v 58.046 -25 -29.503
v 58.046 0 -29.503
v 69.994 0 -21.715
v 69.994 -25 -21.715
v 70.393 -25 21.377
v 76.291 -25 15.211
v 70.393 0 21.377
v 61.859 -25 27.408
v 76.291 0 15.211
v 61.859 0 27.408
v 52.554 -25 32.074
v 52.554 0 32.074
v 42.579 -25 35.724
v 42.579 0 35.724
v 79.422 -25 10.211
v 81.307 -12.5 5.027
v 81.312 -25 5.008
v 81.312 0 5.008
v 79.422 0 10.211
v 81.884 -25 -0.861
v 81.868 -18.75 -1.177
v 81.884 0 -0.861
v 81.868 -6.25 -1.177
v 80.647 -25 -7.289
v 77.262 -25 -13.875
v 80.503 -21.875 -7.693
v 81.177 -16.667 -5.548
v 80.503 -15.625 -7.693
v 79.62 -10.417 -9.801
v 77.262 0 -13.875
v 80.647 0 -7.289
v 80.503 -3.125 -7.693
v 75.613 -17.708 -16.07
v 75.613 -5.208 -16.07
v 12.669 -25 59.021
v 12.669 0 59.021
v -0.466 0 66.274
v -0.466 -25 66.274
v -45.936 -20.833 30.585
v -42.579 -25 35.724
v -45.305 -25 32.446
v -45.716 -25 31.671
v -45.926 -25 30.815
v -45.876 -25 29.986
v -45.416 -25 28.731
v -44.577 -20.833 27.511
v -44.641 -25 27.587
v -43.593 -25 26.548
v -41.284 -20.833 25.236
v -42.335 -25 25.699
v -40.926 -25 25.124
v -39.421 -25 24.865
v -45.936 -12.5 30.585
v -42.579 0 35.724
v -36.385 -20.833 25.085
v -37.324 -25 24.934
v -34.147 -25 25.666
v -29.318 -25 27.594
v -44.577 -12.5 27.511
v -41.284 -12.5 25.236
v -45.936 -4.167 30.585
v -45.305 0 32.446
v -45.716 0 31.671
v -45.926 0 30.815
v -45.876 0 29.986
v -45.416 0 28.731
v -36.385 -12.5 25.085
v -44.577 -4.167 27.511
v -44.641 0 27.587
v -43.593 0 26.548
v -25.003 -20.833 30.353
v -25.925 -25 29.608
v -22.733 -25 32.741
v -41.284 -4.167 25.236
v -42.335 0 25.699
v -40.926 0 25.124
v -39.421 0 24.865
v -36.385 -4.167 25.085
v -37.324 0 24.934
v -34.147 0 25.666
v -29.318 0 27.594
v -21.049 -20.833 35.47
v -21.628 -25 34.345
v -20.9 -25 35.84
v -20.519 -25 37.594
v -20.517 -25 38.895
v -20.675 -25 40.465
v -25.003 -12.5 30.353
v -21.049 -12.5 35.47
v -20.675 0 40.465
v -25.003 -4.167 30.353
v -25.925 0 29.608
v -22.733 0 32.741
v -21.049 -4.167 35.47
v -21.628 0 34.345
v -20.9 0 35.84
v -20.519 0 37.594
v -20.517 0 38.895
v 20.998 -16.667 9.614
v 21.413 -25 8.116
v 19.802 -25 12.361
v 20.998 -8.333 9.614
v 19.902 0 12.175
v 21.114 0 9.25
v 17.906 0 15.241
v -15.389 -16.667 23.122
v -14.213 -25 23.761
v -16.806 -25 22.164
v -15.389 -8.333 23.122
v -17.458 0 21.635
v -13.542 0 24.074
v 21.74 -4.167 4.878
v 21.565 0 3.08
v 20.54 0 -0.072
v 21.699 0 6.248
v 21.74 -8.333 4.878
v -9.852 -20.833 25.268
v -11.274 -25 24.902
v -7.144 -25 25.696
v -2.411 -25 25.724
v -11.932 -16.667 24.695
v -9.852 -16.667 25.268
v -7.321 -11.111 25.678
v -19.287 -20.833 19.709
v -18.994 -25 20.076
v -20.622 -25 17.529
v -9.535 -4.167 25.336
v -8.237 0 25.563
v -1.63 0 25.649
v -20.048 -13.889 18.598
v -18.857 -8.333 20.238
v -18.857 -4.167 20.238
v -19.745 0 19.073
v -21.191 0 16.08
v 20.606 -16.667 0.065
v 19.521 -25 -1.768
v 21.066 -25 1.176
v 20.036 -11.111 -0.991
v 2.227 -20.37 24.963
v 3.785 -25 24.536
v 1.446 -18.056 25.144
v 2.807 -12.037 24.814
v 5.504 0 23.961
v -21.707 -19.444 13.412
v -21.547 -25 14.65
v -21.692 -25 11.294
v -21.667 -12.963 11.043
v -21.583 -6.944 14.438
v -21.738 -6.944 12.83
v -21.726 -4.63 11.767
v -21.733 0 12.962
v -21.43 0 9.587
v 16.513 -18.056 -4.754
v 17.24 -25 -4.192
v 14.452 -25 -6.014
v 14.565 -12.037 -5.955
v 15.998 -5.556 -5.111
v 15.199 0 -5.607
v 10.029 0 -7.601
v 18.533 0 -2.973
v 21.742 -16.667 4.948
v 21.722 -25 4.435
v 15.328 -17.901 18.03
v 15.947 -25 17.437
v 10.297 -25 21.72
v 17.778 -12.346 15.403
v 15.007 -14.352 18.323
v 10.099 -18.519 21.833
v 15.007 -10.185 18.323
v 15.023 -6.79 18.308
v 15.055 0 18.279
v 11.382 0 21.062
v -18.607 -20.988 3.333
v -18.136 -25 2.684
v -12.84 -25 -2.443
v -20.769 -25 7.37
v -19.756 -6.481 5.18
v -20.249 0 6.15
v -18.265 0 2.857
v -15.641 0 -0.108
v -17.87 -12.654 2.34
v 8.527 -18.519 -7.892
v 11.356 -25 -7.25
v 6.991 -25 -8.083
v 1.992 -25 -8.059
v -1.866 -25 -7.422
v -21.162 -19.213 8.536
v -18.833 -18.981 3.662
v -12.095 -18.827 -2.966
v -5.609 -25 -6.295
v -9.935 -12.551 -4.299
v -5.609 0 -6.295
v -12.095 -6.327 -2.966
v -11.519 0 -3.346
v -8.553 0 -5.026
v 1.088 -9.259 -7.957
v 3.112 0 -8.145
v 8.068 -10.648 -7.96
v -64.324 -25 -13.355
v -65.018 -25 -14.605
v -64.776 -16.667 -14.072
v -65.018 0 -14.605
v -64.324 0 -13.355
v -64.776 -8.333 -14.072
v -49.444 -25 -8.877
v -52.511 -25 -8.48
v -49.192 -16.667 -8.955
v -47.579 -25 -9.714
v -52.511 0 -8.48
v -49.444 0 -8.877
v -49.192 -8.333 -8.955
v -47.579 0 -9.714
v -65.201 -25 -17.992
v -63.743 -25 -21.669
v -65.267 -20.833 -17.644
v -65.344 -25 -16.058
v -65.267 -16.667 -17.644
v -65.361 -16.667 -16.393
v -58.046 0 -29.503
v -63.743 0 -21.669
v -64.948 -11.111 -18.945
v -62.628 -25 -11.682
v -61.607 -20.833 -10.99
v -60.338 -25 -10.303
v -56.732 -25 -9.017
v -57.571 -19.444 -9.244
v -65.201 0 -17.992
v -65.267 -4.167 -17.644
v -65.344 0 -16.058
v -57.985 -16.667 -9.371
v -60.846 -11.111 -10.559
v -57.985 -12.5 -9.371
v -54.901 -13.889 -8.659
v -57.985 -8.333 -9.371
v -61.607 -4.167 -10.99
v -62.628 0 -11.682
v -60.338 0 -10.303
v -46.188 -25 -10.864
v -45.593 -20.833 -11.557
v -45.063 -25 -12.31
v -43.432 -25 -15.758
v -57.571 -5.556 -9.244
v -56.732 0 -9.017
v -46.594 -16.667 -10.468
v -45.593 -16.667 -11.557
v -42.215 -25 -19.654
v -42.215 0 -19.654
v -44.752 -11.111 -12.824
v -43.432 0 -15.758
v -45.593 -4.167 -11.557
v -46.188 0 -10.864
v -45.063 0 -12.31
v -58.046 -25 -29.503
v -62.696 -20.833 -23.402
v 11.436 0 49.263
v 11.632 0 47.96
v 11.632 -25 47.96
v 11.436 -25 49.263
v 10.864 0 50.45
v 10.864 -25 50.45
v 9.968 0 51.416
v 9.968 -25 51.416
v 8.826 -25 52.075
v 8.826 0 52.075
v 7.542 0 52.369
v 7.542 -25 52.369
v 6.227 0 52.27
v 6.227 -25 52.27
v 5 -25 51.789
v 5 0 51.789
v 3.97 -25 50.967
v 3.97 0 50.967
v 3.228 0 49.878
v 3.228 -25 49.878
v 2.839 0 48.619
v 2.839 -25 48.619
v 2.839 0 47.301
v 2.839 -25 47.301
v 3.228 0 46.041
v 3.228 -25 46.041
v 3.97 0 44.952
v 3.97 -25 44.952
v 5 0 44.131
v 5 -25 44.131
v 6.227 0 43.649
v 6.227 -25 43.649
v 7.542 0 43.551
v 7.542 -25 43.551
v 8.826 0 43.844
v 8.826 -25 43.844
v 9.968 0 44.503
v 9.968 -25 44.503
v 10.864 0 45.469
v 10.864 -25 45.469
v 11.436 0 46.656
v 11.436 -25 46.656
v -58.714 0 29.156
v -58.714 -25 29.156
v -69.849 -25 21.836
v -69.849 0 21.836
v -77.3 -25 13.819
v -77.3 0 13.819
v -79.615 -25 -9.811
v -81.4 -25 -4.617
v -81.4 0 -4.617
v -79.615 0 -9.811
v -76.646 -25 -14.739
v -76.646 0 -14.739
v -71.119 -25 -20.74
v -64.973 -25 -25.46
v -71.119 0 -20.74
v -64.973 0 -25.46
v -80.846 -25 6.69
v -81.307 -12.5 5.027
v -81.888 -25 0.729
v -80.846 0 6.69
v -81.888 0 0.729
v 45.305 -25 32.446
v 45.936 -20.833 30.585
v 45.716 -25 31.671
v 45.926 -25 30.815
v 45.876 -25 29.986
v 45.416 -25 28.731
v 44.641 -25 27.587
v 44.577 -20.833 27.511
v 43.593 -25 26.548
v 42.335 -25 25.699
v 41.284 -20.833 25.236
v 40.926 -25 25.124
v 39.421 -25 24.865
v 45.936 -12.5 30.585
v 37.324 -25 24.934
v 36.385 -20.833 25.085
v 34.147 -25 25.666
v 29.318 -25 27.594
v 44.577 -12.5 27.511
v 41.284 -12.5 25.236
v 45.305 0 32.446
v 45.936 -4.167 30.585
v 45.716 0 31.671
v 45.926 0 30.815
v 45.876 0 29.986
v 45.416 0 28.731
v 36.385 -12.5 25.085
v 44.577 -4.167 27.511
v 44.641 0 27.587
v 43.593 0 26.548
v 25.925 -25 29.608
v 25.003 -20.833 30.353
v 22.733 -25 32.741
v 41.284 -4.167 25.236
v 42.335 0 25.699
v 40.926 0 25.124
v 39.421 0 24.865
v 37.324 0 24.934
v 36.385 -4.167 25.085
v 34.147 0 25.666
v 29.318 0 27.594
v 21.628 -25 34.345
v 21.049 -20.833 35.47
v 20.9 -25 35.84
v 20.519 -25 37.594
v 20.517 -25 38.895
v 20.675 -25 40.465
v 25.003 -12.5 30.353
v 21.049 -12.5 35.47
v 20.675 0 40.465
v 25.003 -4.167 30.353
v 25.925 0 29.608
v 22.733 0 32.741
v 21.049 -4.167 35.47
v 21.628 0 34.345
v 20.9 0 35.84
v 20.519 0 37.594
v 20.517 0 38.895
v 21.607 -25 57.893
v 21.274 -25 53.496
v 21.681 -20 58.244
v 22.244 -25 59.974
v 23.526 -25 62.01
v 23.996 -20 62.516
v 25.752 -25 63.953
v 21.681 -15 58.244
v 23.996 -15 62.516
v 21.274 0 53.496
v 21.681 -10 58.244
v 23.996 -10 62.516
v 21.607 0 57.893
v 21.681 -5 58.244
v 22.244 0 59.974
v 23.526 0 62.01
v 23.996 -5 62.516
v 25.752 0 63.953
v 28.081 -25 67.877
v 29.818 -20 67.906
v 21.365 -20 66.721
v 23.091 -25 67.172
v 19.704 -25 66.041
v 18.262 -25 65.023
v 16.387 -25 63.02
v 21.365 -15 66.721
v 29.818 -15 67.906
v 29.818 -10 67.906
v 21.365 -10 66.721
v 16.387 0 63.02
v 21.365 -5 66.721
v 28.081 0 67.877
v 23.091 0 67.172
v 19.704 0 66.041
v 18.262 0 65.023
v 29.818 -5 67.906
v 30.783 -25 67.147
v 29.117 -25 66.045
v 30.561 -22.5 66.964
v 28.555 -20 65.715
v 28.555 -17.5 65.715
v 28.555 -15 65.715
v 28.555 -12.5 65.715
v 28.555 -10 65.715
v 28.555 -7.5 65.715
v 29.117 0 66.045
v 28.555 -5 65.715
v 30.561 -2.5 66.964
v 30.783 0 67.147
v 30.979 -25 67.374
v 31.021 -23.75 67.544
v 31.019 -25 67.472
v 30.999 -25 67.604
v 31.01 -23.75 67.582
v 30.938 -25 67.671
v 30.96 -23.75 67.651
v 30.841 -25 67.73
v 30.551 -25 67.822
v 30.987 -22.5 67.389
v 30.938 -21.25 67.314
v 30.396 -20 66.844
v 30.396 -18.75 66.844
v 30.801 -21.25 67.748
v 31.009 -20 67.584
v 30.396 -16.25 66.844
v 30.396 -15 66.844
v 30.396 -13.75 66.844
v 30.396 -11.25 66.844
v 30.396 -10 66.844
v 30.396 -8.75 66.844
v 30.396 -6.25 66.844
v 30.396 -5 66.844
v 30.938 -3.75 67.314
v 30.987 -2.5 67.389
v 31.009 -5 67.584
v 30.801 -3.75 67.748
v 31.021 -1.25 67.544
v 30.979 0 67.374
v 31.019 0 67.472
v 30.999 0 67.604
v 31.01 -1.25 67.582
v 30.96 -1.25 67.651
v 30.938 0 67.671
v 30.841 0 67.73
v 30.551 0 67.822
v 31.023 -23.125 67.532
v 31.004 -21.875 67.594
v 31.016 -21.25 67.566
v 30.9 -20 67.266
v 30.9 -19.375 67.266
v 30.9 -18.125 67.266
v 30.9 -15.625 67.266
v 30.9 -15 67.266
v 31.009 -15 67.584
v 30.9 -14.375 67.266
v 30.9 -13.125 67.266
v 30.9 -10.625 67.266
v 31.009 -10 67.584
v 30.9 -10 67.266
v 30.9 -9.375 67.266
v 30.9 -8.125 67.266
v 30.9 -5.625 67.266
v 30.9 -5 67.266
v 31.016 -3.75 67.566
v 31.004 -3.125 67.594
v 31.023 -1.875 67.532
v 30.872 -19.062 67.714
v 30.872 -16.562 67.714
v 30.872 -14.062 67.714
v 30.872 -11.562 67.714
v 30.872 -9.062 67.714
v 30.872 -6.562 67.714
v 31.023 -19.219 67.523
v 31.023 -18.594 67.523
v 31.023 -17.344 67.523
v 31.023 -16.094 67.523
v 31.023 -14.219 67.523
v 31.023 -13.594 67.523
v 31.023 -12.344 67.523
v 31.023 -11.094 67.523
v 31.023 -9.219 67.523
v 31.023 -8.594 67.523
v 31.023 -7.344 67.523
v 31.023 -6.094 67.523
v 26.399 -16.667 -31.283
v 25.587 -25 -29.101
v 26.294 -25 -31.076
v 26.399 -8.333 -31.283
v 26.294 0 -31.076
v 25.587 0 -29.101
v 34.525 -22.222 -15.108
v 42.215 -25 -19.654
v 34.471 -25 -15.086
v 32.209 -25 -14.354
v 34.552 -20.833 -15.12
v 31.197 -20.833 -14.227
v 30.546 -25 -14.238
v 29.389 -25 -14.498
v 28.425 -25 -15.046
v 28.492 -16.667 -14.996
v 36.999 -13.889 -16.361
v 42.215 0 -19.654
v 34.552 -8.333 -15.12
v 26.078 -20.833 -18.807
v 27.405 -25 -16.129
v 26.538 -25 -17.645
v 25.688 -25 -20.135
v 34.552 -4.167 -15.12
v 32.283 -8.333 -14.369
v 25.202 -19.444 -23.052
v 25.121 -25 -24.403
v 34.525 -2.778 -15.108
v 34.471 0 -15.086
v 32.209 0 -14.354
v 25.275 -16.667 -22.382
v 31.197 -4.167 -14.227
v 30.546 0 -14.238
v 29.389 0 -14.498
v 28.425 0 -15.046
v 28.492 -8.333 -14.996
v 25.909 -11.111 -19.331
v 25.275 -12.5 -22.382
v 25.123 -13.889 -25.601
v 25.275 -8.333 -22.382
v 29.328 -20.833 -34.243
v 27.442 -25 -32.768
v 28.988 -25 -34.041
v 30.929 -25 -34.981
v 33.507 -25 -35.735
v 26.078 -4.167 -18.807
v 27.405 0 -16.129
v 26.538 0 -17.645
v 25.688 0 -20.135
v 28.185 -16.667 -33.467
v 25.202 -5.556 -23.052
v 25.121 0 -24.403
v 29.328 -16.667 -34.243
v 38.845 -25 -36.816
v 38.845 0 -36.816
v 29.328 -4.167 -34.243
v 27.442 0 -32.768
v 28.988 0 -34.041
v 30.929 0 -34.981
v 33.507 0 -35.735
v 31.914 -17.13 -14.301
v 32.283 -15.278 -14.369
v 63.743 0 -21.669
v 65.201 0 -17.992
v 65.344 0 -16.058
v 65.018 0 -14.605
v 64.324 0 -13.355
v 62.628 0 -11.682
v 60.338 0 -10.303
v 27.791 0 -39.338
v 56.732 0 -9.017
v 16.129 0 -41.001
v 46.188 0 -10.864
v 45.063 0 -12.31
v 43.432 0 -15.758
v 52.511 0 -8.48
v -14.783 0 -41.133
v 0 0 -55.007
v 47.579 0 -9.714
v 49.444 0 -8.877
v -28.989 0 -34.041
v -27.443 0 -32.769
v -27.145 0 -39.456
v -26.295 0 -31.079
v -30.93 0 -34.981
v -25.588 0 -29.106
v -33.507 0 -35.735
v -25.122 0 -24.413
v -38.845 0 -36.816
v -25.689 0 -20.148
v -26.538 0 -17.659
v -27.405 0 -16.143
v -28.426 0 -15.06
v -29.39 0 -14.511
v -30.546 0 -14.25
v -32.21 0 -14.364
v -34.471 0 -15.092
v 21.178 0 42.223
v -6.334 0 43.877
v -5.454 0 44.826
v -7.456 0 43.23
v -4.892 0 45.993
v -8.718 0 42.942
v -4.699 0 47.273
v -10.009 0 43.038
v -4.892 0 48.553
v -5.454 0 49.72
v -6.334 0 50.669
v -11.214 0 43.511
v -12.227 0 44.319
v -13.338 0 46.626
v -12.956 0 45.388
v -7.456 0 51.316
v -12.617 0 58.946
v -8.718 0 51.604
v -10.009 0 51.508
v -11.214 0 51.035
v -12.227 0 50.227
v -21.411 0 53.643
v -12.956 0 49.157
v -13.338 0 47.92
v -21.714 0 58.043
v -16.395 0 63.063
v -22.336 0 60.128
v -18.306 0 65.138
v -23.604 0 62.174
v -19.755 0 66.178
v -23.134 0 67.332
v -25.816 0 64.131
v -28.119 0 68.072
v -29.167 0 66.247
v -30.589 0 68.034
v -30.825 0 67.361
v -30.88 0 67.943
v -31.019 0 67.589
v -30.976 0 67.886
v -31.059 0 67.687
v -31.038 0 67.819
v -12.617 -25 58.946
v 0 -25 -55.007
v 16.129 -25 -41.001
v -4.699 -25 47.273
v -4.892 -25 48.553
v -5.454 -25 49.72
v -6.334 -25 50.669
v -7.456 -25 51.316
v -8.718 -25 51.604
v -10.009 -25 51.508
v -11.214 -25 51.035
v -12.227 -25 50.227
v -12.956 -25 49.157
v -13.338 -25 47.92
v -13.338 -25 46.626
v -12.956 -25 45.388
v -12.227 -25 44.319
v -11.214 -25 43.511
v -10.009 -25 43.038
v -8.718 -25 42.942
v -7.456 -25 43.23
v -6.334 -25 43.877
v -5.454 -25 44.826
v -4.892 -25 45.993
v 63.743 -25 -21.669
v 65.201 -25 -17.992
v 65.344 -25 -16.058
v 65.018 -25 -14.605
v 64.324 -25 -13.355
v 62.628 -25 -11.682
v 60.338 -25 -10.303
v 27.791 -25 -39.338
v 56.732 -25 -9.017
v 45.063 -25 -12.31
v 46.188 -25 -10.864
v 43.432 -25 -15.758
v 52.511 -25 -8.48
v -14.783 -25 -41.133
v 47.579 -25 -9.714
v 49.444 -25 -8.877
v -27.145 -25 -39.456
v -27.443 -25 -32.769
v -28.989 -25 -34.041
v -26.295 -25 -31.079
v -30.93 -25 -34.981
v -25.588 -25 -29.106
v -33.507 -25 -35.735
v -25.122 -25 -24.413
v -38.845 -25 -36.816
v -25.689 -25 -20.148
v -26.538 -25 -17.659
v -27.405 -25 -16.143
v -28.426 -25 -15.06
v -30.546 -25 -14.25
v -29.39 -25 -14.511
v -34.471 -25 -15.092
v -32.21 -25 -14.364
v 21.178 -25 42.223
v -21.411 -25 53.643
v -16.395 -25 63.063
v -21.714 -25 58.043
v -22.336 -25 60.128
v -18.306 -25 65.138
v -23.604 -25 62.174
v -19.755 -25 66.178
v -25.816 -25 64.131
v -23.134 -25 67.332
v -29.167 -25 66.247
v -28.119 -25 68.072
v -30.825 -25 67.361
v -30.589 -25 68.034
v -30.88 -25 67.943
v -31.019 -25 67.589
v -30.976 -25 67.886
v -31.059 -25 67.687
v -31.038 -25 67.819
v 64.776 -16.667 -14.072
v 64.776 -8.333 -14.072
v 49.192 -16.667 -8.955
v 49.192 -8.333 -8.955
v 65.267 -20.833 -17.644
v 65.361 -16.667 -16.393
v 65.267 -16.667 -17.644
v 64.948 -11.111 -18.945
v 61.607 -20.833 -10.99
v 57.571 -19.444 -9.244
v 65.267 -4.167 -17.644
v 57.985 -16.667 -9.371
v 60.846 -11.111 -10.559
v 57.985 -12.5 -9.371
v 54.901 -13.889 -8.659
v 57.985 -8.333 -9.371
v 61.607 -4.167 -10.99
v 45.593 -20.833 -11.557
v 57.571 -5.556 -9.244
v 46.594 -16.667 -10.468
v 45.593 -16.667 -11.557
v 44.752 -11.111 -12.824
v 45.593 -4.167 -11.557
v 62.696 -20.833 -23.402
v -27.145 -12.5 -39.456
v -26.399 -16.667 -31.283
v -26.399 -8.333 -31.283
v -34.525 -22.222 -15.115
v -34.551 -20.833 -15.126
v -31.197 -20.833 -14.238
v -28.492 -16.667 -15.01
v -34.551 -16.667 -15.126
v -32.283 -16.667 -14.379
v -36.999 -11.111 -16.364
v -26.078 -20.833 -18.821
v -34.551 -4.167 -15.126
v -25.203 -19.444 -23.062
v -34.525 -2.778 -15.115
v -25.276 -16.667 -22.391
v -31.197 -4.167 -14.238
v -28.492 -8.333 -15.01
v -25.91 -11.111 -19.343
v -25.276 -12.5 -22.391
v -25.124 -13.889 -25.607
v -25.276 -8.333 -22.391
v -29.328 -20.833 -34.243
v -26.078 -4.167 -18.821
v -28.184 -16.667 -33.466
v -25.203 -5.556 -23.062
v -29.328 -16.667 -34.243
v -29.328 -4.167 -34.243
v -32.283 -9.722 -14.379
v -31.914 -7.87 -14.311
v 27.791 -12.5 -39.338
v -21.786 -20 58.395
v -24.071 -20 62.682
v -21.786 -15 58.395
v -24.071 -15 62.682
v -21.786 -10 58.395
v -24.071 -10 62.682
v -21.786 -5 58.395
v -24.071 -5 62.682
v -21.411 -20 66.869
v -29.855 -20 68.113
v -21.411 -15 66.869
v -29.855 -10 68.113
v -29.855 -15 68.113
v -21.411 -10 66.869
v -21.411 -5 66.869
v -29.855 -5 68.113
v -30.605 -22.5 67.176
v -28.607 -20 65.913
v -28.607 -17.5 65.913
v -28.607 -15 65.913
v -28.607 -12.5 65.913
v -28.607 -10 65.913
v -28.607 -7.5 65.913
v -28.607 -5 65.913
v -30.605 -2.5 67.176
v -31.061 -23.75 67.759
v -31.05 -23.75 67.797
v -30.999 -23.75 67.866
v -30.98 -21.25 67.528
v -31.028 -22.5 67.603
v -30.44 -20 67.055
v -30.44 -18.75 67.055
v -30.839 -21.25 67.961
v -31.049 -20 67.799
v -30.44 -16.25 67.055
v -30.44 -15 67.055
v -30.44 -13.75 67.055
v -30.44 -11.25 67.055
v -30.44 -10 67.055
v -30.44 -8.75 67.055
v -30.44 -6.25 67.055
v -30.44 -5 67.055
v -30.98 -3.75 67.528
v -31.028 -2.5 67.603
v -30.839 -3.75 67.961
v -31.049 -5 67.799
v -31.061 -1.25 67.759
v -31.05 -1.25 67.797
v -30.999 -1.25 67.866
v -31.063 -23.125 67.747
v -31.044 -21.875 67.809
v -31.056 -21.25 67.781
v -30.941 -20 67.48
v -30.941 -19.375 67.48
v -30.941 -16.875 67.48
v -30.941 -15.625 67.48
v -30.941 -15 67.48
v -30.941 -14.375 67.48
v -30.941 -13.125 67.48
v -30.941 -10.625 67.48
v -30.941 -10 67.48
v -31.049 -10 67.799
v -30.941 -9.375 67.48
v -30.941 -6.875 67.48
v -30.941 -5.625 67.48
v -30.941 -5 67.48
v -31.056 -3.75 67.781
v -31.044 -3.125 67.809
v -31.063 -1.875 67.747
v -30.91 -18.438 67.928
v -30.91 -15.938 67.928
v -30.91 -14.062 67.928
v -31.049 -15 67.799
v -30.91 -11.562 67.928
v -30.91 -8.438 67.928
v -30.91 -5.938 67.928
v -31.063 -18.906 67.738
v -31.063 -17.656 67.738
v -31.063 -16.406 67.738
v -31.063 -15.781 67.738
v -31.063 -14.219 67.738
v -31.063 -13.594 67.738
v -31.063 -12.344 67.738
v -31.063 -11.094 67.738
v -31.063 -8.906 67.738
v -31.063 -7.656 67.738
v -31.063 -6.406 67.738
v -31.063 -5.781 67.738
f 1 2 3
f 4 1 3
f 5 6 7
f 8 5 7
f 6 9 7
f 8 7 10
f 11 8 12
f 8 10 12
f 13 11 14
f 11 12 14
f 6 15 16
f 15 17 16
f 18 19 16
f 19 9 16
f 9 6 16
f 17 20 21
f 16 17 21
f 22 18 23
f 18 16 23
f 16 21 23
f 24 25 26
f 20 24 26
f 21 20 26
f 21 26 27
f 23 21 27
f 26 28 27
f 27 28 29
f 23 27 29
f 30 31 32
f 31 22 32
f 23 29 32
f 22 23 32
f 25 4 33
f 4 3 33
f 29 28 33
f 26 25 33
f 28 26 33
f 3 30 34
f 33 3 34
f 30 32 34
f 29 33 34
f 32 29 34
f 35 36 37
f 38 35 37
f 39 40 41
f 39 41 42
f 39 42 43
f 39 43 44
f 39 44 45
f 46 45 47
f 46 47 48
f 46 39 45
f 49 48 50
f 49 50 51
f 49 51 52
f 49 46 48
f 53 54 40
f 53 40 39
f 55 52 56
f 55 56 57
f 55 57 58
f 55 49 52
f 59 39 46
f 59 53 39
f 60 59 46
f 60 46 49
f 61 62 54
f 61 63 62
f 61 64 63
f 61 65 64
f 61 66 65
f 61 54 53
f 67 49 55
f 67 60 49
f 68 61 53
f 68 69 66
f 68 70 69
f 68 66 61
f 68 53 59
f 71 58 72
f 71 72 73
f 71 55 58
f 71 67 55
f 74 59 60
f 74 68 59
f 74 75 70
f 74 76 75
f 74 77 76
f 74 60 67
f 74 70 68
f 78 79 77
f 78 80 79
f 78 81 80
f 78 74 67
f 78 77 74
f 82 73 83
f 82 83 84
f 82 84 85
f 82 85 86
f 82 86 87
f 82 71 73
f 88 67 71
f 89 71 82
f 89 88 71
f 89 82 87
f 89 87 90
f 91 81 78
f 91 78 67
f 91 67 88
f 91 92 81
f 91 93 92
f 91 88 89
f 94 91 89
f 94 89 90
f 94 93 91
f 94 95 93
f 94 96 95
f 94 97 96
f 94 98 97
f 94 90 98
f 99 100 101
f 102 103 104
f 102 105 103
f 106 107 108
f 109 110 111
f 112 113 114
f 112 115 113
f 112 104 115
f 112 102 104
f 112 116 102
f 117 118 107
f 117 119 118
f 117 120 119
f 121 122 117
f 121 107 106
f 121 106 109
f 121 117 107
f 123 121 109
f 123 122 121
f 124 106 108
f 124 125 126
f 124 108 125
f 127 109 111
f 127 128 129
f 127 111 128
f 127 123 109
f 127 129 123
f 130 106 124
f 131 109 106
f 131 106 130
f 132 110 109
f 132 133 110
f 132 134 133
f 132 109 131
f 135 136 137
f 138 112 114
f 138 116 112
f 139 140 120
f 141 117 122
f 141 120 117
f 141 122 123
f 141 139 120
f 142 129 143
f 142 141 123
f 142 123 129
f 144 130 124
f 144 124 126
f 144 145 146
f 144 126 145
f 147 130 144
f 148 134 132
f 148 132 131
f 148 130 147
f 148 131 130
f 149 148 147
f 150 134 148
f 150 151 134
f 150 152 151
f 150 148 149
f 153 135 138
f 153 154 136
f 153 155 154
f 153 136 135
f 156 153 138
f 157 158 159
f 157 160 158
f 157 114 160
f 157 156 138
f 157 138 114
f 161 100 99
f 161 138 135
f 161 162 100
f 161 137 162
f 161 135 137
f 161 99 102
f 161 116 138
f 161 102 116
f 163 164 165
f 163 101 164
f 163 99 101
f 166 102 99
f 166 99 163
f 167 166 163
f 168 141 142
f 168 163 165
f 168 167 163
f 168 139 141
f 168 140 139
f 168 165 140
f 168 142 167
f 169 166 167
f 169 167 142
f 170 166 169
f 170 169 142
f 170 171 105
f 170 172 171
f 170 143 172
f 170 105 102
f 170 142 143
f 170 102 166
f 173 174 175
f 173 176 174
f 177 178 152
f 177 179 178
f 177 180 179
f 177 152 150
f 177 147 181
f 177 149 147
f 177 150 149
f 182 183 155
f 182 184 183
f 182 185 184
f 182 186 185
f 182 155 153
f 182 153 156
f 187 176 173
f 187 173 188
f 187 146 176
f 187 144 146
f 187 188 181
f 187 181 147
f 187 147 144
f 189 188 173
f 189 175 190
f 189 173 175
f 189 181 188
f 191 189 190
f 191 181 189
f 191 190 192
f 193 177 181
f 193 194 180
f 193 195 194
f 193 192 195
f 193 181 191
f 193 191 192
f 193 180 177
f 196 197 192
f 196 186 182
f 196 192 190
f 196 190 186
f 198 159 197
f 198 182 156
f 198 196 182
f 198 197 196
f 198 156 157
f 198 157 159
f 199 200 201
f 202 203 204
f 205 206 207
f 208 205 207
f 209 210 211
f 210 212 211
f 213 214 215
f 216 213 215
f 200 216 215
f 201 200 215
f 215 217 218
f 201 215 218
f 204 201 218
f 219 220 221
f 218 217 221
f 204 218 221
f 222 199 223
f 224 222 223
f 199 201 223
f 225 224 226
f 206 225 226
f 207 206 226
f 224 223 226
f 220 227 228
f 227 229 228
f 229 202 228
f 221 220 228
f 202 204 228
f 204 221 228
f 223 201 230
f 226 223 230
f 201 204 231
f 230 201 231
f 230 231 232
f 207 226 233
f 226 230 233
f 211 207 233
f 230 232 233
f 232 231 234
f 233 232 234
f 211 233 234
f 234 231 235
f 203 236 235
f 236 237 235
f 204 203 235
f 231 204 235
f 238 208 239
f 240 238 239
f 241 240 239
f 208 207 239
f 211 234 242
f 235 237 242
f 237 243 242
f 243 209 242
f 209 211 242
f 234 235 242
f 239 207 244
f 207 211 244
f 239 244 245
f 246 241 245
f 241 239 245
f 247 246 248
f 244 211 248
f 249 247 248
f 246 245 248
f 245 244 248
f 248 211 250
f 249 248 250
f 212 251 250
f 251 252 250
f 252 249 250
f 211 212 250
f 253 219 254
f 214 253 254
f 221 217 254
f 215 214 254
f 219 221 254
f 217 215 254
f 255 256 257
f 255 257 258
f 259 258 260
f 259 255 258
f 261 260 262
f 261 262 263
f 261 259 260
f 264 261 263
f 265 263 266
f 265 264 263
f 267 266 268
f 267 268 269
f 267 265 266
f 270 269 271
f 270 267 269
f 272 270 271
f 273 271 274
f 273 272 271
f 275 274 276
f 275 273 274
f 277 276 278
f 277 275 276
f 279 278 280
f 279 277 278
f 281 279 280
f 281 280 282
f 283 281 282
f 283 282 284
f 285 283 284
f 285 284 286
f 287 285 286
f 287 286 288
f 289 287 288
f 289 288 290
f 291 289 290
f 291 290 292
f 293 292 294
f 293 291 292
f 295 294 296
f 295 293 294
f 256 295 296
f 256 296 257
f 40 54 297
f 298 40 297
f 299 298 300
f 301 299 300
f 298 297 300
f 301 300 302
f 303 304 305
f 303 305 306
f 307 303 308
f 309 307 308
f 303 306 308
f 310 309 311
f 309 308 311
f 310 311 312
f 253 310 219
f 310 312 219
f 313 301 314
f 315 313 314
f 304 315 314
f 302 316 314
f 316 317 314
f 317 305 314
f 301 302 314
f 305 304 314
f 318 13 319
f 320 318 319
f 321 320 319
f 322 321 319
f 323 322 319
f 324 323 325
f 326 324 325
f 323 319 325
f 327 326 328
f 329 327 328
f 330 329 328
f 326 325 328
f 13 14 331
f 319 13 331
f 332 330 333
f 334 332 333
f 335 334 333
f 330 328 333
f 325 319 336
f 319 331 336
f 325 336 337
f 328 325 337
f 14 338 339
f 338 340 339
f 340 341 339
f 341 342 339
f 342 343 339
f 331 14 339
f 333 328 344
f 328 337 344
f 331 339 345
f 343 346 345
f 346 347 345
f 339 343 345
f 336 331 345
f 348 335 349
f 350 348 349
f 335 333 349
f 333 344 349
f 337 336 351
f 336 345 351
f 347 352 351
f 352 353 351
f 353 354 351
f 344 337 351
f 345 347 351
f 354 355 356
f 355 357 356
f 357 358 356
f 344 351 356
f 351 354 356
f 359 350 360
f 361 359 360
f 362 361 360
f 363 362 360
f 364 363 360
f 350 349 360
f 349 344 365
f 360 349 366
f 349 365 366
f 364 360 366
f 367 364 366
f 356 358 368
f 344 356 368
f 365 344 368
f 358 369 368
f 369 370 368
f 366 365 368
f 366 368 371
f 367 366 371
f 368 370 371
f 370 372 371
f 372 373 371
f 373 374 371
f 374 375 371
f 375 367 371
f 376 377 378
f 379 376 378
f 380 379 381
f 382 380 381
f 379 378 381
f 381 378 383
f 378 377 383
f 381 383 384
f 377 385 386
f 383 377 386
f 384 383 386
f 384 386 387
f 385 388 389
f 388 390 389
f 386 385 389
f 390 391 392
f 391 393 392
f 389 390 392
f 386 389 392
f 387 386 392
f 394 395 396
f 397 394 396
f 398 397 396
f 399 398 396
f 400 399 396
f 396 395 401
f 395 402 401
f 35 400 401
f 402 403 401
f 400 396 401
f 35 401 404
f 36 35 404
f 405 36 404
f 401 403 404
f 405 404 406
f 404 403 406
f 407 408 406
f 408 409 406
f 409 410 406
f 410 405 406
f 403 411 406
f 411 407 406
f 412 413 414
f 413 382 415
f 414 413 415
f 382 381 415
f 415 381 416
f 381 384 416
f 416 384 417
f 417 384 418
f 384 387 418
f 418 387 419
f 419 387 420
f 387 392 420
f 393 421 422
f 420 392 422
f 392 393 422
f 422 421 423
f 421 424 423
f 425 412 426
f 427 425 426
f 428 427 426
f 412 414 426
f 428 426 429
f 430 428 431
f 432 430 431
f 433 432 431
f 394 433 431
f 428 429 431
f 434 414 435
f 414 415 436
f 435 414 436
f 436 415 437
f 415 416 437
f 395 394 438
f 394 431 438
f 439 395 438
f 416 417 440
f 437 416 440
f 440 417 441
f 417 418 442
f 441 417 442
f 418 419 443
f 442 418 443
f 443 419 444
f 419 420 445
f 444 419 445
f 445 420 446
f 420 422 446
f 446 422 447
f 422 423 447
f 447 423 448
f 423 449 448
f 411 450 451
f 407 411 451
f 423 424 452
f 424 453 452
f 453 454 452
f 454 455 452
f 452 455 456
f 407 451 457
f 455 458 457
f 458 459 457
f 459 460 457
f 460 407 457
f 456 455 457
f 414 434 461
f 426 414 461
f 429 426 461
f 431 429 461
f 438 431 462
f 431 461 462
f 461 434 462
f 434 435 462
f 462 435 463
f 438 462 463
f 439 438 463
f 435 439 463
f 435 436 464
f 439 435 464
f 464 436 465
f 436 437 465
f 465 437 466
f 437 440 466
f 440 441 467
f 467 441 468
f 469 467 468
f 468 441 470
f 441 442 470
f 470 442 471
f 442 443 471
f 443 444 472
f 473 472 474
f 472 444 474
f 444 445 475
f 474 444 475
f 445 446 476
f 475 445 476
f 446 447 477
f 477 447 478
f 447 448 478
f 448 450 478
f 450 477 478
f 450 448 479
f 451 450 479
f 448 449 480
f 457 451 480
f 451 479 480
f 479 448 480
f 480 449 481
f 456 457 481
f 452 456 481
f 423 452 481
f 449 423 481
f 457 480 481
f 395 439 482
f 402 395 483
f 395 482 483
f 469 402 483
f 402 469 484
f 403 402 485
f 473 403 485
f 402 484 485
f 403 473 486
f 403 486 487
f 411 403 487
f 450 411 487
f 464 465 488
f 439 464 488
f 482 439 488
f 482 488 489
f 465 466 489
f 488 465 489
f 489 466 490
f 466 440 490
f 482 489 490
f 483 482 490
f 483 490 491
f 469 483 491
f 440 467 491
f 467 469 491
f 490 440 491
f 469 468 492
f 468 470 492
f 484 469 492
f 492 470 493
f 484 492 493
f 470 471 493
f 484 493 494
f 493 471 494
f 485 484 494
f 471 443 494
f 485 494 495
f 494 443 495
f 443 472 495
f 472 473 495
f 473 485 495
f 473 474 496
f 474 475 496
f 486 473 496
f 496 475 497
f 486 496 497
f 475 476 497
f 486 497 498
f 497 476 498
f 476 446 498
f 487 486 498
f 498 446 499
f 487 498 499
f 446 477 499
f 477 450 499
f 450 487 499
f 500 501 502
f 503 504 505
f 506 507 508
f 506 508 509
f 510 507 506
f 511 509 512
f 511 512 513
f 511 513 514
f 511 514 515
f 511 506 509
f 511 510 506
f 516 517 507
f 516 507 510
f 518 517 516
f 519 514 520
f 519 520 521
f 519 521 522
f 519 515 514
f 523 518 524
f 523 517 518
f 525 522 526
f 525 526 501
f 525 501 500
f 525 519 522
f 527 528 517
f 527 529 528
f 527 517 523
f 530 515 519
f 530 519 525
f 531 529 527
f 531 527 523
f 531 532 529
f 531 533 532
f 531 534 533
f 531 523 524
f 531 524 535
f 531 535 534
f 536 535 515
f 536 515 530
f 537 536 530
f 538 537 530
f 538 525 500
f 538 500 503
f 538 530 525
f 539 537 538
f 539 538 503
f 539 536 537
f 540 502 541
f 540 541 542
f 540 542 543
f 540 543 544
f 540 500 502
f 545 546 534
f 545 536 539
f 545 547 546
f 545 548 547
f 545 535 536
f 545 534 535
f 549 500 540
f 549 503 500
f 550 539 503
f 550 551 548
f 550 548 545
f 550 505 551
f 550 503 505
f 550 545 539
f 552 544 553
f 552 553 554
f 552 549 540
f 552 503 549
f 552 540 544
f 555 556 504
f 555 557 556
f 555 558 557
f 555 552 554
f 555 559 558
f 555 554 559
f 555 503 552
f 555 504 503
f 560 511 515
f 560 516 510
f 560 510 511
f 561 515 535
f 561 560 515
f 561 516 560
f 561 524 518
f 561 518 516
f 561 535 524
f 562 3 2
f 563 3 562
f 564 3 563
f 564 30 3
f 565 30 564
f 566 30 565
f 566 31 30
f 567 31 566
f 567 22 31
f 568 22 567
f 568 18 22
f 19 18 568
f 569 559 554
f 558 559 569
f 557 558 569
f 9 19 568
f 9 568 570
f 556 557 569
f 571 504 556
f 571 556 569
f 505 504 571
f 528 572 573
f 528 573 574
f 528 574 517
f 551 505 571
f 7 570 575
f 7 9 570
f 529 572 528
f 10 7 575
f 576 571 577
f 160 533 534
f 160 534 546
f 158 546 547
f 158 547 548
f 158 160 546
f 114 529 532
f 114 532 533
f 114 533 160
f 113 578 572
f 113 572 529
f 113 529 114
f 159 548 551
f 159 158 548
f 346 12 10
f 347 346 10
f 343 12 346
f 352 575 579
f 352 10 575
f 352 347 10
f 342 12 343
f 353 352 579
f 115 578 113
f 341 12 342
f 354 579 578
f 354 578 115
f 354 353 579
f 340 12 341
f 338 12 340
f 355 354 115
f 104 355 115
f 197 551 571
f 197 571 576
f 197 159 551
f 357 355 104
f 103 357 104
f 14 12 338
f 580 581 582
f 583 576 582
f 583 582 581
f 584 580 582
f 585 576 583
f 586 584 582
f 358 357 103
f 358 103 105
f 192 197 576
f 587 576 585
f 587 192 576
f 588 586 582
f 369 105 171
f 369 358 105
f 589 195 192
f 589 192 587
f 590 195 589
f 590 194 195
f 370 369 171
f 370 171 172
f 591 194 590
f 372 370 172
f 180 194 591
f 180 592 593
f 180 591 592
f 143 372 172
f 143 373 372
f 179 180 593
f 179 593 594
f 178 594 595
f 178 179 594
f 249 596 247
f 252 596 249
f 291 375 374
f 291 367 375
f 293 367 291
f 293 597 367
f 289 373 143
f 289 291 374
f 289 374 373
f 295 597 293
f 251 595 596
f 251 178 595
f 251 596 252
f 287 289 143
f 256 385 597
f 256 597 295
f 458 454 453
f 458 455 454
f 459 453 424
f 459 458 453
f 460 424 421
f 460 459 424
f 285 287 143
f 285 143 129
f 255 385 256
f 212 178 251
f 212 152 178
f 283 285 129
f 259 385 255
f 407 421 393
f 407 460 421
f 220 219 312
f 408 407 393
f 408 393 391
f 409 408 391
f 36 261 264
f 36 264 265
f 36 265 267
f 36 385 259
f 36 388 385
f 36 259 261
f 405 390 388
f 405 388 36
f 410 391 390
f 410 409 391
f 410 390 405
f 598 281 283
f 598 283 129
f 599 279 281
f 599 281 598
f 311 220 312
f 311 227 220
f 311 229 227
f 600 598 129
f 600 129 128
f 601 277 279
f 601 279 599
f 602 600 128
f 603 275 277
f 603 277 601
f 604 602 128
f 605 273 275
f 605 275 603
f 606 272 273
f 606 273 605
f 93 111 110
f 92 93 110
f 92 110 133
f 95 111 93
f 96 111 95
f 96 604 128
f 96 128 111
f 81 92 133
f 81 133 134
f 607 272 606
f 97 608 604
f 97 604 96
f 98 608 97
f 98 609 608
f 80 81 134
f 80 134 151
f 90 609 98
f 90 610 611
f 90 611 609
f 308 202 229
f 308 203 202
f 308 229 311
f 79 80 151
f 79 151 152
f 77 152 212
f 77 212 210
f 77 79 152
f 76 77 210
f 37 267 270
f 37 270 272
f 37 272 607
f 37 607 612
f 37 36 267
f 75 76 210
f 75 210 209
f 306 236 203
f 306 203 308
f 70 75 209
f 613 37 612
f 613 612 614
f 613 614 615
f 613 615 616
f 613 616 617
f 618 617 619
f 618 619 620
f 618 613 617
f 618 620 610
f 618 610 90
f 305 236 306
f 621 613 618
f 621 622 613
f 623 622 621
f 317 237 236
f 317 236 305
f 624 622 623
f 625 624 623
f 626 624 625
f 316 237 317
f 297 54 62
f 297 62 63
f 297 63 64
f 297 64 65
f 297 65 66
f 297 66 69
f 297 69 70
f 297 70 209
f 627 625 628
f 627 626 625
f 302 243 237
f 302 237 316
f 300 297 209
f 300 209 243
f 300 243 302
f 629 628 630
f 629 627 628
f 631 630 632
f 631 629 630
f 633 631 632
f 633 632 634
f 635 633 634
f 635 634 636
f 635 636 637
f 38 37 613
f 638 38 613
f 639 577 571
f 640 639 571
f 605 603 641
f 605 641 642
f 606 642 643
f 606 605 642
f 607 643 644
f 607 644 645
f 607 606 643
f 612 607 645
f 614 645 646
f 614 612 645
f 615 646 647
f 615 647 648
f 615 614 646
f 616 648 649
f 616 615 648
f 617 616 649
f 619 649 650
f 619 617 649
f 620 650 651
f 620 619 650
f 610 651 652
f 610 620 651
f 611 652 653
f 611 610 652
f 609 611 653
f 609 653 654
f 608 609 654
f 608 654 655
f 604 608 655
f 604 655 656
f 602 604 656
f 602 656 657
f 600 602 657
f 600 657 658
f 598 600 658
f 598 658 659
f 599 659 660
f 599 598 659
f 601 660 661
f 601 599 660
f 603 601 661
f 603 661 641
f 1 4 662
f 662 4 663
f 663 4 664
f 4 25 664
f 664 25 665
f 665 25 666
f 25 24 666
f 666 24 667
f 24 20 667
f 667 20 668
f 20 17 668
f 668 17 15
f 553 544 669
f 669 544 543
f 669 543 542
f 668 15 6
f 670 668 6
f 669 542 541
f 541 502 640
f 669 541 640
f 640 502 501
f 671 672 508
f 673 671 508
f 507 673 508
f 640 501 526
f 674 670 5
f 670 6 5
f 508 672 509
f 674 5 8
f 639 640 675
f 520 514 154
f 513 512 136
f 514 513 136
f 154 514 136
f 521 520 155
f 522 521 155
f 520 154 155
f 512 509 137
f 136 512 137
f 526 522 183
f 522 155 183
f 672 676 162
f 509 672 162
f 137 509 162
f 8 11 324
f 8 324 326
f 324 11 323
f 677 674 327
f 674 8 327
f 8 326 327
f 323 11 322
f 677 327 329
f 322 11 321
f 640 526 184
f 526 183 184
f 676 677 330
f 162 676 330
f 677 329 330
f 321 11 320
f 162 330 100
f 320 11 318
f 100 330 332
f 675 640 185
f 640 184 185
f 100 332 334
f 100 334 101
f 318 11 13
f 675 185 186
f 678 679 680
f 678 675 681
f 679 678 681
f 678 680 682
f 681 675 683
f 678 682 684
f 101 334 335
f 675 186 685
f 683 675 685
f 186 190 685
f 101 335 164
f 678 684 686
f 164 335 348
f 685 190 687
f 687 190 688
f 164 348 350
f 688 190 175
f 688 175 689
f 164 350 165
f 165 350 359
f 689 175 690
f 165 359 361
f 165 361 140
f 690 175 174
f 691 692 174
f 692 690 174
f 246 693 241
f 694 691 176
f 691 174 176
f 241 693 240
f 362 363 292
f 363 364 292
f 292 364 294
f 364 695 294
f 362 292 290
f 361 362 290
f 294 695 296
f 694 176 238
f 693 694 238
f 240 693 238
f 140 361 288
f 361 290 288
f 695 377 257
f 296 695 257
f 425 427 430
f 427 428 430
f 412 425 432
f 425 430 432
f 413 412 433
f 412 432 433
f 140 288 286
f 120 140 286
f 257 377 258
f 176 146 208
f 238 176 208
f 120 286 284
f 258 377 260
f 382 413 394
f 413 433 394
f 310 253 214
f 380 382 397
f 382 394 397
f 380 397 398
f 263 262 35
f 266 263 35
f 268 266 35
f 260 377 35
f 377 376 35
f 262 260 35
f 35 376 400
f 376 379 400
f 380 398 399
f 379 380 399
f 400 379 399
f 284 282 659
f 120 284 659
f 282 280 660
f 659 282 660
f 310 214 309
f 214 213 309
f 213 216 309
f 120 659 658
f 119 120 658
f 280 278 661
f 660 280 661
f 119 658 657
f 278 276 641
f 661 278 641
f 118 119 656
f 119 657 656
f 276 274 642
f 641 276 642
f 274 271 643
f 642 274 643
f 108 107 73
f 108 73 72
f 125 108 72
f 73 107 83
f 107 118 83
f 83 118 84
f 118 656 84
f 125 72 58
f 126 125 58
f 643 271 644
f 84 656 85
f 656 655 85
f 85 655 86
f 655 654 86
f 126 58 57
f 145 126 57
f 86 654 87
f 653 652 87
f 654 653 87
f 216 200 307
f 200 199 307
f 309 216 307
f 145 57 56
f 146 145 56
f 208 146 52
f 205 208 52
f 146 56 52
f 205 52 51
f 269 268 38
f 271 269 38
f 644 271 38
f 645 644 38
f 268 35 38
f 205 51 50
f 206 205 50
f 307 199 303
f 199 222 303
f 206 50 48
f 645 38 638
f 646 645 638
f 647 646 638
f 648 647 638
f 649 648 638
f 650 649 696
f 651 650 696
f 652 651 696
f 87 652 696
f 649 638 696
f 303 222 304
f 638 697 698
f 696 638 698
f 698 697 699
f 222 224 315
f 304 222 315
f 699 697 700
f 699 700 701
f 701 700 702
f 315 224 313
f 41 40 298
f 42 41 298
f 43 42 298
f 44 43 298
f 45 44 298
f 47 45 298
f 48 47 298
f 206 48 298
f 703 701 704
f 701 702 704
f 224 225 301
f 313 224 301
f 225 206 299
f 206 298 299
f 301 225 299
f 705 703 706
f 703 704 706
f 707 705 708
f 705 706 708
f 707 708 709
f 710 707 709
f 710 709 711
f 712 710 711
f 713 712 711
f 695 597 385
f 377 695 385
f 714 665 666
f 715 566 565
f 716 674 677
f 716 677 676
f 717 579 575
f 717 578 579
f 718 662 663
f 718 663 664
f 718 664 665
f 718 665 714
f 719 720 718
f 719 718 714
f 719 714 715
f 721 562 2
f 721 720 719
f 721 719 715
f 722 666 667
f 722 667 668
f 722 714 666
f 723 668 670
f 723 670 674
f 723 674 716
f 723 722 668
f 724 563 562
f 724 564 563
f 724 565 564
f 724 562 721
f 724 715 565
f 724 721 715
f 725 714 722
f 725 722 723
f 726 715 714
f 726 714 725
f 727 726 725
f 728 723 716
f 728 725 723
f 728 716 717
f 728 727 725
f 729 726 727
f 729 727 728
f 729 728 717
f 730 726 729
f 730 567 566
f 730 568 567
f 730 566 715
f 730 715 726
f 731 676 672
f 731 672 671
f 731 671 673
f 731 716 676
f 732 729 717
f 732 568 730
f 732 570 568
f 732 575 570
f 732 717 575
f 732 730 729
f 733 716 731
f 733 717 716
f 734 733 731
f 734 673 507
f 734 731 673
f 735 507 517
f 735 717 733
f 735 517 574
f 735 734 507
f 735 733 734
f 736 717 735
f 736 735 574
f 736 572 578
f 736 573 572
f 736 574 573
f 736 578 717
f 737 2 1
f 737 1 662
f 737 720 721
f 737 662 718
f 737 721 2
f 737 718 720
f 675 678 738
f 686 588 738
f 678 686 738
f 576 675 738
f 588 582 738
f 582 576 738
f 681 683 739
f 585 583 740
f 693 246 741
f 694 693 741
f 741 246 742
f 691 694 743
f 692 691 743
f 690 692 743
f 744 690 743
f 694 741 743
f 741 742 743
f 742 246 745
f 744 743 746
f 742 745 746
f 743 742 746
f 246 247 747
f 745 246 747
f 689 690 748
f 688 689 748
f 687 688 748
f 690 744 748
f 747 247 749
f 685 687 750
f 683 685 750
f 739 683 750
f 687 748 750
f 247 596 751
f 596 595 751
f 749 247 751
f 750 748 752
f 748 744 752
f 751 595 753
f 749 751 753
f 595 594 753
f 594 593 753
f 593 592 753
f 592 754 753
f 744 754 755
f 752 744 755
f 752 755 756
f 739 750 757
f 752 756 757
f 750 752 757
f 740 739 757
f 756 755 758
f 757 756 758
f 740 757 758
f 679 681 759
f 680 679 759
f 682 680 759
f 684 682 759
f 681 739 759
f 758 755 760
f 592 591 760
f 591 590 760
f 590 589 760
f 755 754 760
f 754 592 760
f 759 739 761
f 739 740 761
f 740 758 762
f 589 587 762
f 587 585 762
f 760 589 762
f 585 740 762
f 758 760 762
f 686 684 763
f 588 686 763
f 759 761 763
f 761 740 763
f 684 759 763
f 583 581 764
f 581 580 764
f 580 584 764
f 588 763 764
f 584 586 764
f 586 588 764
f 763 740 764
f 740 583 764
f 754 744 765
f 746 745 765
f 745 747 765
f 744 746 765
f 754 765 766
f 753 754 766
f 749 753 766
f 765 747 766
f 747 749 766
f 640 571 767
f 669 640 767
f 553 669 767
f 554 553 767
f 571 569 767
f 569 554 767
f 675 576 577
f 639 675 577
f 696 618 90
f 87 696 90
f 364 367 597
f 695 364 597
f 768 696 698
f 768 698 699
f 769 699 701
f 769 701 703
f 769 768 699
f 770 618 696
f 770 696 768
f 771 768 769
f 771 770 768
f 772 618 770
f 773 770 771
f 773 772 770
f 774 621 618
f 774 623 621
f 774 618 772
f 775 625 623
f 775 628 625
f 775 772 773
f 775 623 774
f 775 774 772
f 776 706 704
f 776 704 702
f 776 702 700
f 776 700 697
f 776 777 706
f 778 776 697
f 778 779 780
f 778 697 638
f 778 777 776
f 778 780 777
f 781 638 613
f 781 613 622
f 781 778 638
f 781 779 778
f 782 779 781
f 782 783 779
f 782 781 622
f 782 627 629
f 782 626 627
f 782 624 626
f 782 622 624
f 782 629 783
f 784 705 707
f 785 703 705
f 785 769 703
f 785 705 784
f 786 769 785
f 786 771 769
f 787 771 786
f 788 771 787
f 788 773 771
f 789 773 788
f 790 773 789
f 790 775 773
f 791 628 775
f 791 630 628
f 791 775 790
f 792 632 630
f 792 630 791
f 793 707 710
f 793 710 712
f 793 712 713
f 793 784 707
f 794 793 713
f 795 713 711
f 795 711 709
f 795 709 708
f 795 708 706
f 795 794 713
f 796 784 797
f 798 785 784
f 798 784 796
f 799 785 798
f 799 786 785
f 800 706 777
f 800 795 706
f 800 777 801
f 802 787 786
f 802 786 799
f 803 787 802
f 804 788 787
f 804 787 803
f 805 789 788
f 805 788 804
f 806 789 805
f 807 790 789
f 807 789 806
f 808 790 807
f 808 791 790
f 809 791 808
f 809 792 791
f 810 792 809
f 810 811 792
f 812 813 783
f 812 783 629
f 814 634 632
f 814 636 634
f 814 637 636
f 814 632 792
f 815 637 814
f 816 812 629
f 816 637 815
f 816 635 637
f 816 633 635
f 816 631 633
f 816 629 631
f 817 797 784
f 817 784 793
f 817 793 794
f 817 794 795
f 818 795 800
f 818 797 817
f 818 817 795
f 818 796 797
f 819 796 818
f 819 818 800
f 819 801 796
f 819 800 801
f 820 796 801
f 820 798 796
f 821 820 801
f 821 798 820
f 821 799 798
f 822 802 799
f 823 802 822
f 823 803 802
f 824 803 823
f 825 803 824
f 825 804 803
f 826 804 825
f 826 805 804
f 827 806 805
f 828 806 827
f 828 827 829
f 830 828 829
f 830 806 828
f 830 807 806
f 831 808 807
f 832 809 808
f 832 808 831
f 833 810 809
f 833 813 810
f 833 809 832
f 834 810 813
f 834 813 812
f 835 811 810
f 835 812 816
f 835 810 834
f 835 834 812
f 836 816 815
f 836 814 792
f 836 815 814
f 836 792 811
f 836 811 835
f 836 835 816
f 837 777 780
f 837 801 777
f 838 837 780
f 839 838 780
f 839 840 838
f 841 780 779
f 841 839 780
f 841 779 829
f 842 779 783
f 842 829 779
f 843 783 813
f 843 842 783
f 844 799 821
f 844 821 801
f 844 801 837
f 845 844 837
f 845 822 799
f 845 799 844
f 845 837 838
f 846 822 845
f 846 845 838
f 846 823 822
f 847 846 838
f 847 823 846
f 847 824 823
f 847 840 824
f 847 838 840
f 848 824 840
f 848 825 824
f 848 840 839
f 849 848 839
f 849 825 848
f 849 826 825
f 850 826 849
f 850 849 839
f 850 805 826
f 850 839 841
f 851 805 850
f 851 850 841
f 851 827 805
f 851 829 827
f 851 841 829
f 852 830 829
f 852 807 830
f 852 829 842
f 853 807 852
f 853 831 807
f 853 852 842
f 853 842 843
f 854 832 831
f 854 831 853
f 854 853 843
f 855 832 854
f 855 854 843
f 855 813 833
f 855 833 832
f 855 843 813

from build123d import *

# Parameters (mm, degrees)
F0_R     = 4.343536077
F0_R_2   = 4.4212681919
F1_DEPTH = 25
F3_DEPTH = 89.1


with BuildPart() as f1:
    # F0 (on Front) → F1 (new body)
    with BuildSketch(Plane.XZ):
        with BuildLine():
            add(Edge.make_bspline(
                [(-42.5789955947, 35.7237389808), (-44.1290673891, 33.7271293909), (-47.8727718839, 30.9738019057), (-41.4075391544, 23.1554651105), (-31.2618393067, 26.4780976478), (-24.9313776529, 29.7369479228), (-20.4387838067, 35.5054320295), (-20.3836122993, 38.2198165173), (-20.6747909206, 40.4650942553)],
                knots=[0, 0, 0, 0, 0.1567901334, 0.3252925003, 0.5240942378, 0.6974189313, 0.8583526187, 1, 1, 1, 1], degree=3))
            add(Edge.make_bspline(
                [(-42.5789955947, 35.7237389808), (-131.3958555945, 8.1234439542), (-58.045860883, -29.5026875001)],
                knots=[5.2591044043, 5.2591044043, 5.2591044043, 7.0662813777, 7.0662813777, 7.0662813777], degree=2, weights=[1, 0.6187950138, 1]))
            add(Edge.make_bspline(
                [(-58.045860883, -29.5026875001), (-62.604514395, -24.0053786584), (-71.2887374681, -12.5660216125), (-46.4685514653, -5.0852349895), (-43.5541548833, -15.0097510878), (-42.2145798802, -19.6536183357)],
                knots=[0, 0, 0, 0, 0.3498804264, 0.6952337889, 1, 1, 1, 1], degree=3))
            add(Edge.make_bspline(
                [(-42.2145798802, -19.6536183357), (-36.8901871826, -16.1486790794), (-26.1316292472, -8.8921175573), (-23.0049349937, -35.1250507645), (-33.6602260852, -35.6917728883), (-38.8450818012, -36.8164820556)],
                knots=[0, 0, 0, 0, 0.3296131125, 0.6803909908, 1, 1, 1, 1], degree=3))
            add(Edge.make_bspline(
                [(-38.8450818012, -36.8164820556), (-27.4804000382, -39.9427833875), (-14.7834080706, -41.1325707736)],
                knots=[1.0766348496, 1.0766348496, 1.0766348496, 1.3892979187, 1.3892979187, 1.3892979187], degree=2, weights=[1, 0.9878050925, 1]))
            Line((-14.7834080706, -41.1325707736), (0, -55.0068765879))
            Line((0, -55.0068765879), (16.1289498237, -41.0005352266))
            add(Edge.make_bspline(
                [(16.1289498237, -41.0005352266), (28.0977145218, -39.7729668337), (38.8450818011, -36.8164820556)],
                knots=[1.7690244559, 1.7690244559, 1.7690244559, 2.0649578039, 2.0649578039, 2.0649578039], degree=2, weights=[1, 0.9890728902, 1]))
            add(Edge.make_bspline(
                [(42.2145798802, -19.6536183357), (36.890427794, -16.148837469), (26.1305856867, -8.8667391985), (23.0029790845, -35.1285857295), (33.661278201, -35.6920011154), (38.8450818011, -36.8164820556)],
                knots=[0, 0, 0, 0, 0.3295982171, 0.6804558461, 1, 1, 1, 1], degree=3))
            add(Edge.make_bspline(
                [(58.045860883, -29.5026875001), (62.604514395, -24.0053786584), (71.2887374681, -12.5660216125), (46.4685514653, -5.0852349895), (43.5541548833, -15.0097510878), (42.2145798802, -19.6536183357)],
                knots=[0, 0, 0, 0, 0.3498804264, 0.6952337889, 1, 1, 1, 1], degree=3))
            add(Edge.make_bspline(
                [(58.045860883, -29.5026875001), (131.3958555945, 8.1234439542), (42.5789955947, 35.7237389808)],
                knots=[2.3584965831, 2.3584965831, 2.3584965831, 4.1656735565, 4.1656735565, 4.1656735565], degree=2, weights=[1, 0.6187950138, 1]))
            add(Edge.make_bspline(
                [(42.5789955947, 35.7237389808), (44.1290673891, 33.7271293909), (47.8727718839, 30.9738019057), (41.4075391544, 23.1554651105), (31.2618393067, 26.4780976478), (24.9313776529, 29.7369479228), (20.4387838067, 35.5054320295), (20.3836122993, 38.2198165173), (20.6747909206, 40.4650942553)],
                knots=[0, 0, 0, 0, 0.1567901334, 0.3252925003, 0.5240942378, 0.6974189313, 0.8583526187, 1, 1, 1, 1], degree=3))
            Line((20.6747909206, 40.4650942553), (21.1781824952, 42.2227854591))
            Line((21.1781824952, 42.2227854591), (21.2737702686, 53.4955488263))
            add(Edge.make_bspline(
                [(21.2737702686, 53.4955488263), (21.3335687415, 56.7143197433), (21.4506722073, 63.0176450902), (36.4300998889, 68.8816457515), (20.1085893276, 67.3088863882), (17.2450849236, 63.9019002613), (14.2430967269, 60.6986959544), (12.6687599094, 59.0206331345)],
                knots=[0, 0, 0, 0, 0.2193370606, 0.4295281924, 0.6518746091, 0.8159282522, 0.994276585, 0.994276585, 0.994276585, 0.994276585], degree=3))
            Line((12.6687599094, 59.0206331345), (-0.4656925801, 66.2739425835))
            Line((-0.4656925801, 66.2739425835), (-12.617480804, 58.9461281244))
            add(Edge.make_bspline(
                [(-21.4110287852, 53.6434116143), (-21.4485260469, 56.8625195697), (-21.5219570074, 63.1665049396), (-36.4603991598, 69.1341429553), (-20.150176442, 67.4483452466), (-17.2815643601, 63.9868742512), (-14.2306537236, 60.6895778393), (-12.617480804, 58.9461281244)],
                knots=[0, 0, 0, 0, 0.2193370606, 0.4295281924, 0.6518746091, 0.8159282522, 1, 1, 1, 1], degree=3))
            Line((-21.4110287852, 53.6434116143), (-20.6747909206, 40.4650942553))
        make_face()
        with Locations((-9.0425144881, 47.2728945315)):
            Circle(F0_R, mode=Mode.SUBTRACT)
        with Locations((7.2111207992, 47.9596704245)):
            Circle(F0_R_2, mode=Mode.SUBTRACT)
    extrude(amount=F1_DEPTH)

    # F2 (on Front) → F3 (cut)
    with BuildSketch(Plane.XZ):
        with BuildLine():
            add(Edge.make_bspline(
                [(-5.6086485274, -6.2954216264), (30.7782901362, -19.8026943036), (20.9977935955, 9.6144605886), (11.2172970548, 39.0316154808), (-15.3891450681, 23.1217332658), (-41.995587191, 7.2118510508), (-5.6086485274, -6.2954216264)],
                knots=[4.7123889804, 4.7123889804, 4.7123889804, 6.8067840828, 6.8067840828, 8.9011791852, 8.9011791852, 10.9955742876, 10.9955742876, 10.9955742876], degree=2, weights=[1, 0.5, 1, 0.5, 1, 0.5, 1]))
        make_face()
    extrude(amount=F3_DEPTH, mode=Mode.SUBTRACT)


solid = f1.part
